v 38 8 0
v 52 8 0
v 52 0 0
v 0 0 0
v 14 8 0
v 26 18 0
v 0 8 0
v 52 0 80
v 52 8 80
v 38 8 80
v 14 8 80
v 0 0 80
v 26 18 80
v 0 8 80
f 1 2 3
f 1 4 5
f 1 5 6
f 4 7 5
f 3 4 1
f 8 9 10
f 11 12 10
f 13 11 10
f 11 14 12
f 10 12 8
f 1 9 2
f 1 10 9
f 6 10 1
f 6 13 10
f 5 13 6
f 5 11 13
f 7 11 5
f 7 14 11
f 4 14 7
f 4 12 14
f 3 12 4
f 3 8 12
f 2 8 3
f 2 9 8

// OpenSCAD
$fn = 32;

// ----------------------------------------------------------------------
// V guide rail: vrib, 52 mm wide
// ----------------------------------------------------------------------

// --- parameters (mm) ---
rail_w = 52;              // rail width, X
base_t = 8;               // base plate thickness
v_depth = 10;             // V feature depth / height
v_half_w = 12;            // half width of the V at the base face
plate_t = 80;             // rail length, Z (the extrusion height)

profile = [[0, 0], [52, 0], [52, 8], [38, 8], [26, 18], [14, 8], [0, 8]];  // primary outline, 7 points, counter clockwise

// --- the one profile operation ---
linear_extrude(height = plate_t) polygon(points = profile);
